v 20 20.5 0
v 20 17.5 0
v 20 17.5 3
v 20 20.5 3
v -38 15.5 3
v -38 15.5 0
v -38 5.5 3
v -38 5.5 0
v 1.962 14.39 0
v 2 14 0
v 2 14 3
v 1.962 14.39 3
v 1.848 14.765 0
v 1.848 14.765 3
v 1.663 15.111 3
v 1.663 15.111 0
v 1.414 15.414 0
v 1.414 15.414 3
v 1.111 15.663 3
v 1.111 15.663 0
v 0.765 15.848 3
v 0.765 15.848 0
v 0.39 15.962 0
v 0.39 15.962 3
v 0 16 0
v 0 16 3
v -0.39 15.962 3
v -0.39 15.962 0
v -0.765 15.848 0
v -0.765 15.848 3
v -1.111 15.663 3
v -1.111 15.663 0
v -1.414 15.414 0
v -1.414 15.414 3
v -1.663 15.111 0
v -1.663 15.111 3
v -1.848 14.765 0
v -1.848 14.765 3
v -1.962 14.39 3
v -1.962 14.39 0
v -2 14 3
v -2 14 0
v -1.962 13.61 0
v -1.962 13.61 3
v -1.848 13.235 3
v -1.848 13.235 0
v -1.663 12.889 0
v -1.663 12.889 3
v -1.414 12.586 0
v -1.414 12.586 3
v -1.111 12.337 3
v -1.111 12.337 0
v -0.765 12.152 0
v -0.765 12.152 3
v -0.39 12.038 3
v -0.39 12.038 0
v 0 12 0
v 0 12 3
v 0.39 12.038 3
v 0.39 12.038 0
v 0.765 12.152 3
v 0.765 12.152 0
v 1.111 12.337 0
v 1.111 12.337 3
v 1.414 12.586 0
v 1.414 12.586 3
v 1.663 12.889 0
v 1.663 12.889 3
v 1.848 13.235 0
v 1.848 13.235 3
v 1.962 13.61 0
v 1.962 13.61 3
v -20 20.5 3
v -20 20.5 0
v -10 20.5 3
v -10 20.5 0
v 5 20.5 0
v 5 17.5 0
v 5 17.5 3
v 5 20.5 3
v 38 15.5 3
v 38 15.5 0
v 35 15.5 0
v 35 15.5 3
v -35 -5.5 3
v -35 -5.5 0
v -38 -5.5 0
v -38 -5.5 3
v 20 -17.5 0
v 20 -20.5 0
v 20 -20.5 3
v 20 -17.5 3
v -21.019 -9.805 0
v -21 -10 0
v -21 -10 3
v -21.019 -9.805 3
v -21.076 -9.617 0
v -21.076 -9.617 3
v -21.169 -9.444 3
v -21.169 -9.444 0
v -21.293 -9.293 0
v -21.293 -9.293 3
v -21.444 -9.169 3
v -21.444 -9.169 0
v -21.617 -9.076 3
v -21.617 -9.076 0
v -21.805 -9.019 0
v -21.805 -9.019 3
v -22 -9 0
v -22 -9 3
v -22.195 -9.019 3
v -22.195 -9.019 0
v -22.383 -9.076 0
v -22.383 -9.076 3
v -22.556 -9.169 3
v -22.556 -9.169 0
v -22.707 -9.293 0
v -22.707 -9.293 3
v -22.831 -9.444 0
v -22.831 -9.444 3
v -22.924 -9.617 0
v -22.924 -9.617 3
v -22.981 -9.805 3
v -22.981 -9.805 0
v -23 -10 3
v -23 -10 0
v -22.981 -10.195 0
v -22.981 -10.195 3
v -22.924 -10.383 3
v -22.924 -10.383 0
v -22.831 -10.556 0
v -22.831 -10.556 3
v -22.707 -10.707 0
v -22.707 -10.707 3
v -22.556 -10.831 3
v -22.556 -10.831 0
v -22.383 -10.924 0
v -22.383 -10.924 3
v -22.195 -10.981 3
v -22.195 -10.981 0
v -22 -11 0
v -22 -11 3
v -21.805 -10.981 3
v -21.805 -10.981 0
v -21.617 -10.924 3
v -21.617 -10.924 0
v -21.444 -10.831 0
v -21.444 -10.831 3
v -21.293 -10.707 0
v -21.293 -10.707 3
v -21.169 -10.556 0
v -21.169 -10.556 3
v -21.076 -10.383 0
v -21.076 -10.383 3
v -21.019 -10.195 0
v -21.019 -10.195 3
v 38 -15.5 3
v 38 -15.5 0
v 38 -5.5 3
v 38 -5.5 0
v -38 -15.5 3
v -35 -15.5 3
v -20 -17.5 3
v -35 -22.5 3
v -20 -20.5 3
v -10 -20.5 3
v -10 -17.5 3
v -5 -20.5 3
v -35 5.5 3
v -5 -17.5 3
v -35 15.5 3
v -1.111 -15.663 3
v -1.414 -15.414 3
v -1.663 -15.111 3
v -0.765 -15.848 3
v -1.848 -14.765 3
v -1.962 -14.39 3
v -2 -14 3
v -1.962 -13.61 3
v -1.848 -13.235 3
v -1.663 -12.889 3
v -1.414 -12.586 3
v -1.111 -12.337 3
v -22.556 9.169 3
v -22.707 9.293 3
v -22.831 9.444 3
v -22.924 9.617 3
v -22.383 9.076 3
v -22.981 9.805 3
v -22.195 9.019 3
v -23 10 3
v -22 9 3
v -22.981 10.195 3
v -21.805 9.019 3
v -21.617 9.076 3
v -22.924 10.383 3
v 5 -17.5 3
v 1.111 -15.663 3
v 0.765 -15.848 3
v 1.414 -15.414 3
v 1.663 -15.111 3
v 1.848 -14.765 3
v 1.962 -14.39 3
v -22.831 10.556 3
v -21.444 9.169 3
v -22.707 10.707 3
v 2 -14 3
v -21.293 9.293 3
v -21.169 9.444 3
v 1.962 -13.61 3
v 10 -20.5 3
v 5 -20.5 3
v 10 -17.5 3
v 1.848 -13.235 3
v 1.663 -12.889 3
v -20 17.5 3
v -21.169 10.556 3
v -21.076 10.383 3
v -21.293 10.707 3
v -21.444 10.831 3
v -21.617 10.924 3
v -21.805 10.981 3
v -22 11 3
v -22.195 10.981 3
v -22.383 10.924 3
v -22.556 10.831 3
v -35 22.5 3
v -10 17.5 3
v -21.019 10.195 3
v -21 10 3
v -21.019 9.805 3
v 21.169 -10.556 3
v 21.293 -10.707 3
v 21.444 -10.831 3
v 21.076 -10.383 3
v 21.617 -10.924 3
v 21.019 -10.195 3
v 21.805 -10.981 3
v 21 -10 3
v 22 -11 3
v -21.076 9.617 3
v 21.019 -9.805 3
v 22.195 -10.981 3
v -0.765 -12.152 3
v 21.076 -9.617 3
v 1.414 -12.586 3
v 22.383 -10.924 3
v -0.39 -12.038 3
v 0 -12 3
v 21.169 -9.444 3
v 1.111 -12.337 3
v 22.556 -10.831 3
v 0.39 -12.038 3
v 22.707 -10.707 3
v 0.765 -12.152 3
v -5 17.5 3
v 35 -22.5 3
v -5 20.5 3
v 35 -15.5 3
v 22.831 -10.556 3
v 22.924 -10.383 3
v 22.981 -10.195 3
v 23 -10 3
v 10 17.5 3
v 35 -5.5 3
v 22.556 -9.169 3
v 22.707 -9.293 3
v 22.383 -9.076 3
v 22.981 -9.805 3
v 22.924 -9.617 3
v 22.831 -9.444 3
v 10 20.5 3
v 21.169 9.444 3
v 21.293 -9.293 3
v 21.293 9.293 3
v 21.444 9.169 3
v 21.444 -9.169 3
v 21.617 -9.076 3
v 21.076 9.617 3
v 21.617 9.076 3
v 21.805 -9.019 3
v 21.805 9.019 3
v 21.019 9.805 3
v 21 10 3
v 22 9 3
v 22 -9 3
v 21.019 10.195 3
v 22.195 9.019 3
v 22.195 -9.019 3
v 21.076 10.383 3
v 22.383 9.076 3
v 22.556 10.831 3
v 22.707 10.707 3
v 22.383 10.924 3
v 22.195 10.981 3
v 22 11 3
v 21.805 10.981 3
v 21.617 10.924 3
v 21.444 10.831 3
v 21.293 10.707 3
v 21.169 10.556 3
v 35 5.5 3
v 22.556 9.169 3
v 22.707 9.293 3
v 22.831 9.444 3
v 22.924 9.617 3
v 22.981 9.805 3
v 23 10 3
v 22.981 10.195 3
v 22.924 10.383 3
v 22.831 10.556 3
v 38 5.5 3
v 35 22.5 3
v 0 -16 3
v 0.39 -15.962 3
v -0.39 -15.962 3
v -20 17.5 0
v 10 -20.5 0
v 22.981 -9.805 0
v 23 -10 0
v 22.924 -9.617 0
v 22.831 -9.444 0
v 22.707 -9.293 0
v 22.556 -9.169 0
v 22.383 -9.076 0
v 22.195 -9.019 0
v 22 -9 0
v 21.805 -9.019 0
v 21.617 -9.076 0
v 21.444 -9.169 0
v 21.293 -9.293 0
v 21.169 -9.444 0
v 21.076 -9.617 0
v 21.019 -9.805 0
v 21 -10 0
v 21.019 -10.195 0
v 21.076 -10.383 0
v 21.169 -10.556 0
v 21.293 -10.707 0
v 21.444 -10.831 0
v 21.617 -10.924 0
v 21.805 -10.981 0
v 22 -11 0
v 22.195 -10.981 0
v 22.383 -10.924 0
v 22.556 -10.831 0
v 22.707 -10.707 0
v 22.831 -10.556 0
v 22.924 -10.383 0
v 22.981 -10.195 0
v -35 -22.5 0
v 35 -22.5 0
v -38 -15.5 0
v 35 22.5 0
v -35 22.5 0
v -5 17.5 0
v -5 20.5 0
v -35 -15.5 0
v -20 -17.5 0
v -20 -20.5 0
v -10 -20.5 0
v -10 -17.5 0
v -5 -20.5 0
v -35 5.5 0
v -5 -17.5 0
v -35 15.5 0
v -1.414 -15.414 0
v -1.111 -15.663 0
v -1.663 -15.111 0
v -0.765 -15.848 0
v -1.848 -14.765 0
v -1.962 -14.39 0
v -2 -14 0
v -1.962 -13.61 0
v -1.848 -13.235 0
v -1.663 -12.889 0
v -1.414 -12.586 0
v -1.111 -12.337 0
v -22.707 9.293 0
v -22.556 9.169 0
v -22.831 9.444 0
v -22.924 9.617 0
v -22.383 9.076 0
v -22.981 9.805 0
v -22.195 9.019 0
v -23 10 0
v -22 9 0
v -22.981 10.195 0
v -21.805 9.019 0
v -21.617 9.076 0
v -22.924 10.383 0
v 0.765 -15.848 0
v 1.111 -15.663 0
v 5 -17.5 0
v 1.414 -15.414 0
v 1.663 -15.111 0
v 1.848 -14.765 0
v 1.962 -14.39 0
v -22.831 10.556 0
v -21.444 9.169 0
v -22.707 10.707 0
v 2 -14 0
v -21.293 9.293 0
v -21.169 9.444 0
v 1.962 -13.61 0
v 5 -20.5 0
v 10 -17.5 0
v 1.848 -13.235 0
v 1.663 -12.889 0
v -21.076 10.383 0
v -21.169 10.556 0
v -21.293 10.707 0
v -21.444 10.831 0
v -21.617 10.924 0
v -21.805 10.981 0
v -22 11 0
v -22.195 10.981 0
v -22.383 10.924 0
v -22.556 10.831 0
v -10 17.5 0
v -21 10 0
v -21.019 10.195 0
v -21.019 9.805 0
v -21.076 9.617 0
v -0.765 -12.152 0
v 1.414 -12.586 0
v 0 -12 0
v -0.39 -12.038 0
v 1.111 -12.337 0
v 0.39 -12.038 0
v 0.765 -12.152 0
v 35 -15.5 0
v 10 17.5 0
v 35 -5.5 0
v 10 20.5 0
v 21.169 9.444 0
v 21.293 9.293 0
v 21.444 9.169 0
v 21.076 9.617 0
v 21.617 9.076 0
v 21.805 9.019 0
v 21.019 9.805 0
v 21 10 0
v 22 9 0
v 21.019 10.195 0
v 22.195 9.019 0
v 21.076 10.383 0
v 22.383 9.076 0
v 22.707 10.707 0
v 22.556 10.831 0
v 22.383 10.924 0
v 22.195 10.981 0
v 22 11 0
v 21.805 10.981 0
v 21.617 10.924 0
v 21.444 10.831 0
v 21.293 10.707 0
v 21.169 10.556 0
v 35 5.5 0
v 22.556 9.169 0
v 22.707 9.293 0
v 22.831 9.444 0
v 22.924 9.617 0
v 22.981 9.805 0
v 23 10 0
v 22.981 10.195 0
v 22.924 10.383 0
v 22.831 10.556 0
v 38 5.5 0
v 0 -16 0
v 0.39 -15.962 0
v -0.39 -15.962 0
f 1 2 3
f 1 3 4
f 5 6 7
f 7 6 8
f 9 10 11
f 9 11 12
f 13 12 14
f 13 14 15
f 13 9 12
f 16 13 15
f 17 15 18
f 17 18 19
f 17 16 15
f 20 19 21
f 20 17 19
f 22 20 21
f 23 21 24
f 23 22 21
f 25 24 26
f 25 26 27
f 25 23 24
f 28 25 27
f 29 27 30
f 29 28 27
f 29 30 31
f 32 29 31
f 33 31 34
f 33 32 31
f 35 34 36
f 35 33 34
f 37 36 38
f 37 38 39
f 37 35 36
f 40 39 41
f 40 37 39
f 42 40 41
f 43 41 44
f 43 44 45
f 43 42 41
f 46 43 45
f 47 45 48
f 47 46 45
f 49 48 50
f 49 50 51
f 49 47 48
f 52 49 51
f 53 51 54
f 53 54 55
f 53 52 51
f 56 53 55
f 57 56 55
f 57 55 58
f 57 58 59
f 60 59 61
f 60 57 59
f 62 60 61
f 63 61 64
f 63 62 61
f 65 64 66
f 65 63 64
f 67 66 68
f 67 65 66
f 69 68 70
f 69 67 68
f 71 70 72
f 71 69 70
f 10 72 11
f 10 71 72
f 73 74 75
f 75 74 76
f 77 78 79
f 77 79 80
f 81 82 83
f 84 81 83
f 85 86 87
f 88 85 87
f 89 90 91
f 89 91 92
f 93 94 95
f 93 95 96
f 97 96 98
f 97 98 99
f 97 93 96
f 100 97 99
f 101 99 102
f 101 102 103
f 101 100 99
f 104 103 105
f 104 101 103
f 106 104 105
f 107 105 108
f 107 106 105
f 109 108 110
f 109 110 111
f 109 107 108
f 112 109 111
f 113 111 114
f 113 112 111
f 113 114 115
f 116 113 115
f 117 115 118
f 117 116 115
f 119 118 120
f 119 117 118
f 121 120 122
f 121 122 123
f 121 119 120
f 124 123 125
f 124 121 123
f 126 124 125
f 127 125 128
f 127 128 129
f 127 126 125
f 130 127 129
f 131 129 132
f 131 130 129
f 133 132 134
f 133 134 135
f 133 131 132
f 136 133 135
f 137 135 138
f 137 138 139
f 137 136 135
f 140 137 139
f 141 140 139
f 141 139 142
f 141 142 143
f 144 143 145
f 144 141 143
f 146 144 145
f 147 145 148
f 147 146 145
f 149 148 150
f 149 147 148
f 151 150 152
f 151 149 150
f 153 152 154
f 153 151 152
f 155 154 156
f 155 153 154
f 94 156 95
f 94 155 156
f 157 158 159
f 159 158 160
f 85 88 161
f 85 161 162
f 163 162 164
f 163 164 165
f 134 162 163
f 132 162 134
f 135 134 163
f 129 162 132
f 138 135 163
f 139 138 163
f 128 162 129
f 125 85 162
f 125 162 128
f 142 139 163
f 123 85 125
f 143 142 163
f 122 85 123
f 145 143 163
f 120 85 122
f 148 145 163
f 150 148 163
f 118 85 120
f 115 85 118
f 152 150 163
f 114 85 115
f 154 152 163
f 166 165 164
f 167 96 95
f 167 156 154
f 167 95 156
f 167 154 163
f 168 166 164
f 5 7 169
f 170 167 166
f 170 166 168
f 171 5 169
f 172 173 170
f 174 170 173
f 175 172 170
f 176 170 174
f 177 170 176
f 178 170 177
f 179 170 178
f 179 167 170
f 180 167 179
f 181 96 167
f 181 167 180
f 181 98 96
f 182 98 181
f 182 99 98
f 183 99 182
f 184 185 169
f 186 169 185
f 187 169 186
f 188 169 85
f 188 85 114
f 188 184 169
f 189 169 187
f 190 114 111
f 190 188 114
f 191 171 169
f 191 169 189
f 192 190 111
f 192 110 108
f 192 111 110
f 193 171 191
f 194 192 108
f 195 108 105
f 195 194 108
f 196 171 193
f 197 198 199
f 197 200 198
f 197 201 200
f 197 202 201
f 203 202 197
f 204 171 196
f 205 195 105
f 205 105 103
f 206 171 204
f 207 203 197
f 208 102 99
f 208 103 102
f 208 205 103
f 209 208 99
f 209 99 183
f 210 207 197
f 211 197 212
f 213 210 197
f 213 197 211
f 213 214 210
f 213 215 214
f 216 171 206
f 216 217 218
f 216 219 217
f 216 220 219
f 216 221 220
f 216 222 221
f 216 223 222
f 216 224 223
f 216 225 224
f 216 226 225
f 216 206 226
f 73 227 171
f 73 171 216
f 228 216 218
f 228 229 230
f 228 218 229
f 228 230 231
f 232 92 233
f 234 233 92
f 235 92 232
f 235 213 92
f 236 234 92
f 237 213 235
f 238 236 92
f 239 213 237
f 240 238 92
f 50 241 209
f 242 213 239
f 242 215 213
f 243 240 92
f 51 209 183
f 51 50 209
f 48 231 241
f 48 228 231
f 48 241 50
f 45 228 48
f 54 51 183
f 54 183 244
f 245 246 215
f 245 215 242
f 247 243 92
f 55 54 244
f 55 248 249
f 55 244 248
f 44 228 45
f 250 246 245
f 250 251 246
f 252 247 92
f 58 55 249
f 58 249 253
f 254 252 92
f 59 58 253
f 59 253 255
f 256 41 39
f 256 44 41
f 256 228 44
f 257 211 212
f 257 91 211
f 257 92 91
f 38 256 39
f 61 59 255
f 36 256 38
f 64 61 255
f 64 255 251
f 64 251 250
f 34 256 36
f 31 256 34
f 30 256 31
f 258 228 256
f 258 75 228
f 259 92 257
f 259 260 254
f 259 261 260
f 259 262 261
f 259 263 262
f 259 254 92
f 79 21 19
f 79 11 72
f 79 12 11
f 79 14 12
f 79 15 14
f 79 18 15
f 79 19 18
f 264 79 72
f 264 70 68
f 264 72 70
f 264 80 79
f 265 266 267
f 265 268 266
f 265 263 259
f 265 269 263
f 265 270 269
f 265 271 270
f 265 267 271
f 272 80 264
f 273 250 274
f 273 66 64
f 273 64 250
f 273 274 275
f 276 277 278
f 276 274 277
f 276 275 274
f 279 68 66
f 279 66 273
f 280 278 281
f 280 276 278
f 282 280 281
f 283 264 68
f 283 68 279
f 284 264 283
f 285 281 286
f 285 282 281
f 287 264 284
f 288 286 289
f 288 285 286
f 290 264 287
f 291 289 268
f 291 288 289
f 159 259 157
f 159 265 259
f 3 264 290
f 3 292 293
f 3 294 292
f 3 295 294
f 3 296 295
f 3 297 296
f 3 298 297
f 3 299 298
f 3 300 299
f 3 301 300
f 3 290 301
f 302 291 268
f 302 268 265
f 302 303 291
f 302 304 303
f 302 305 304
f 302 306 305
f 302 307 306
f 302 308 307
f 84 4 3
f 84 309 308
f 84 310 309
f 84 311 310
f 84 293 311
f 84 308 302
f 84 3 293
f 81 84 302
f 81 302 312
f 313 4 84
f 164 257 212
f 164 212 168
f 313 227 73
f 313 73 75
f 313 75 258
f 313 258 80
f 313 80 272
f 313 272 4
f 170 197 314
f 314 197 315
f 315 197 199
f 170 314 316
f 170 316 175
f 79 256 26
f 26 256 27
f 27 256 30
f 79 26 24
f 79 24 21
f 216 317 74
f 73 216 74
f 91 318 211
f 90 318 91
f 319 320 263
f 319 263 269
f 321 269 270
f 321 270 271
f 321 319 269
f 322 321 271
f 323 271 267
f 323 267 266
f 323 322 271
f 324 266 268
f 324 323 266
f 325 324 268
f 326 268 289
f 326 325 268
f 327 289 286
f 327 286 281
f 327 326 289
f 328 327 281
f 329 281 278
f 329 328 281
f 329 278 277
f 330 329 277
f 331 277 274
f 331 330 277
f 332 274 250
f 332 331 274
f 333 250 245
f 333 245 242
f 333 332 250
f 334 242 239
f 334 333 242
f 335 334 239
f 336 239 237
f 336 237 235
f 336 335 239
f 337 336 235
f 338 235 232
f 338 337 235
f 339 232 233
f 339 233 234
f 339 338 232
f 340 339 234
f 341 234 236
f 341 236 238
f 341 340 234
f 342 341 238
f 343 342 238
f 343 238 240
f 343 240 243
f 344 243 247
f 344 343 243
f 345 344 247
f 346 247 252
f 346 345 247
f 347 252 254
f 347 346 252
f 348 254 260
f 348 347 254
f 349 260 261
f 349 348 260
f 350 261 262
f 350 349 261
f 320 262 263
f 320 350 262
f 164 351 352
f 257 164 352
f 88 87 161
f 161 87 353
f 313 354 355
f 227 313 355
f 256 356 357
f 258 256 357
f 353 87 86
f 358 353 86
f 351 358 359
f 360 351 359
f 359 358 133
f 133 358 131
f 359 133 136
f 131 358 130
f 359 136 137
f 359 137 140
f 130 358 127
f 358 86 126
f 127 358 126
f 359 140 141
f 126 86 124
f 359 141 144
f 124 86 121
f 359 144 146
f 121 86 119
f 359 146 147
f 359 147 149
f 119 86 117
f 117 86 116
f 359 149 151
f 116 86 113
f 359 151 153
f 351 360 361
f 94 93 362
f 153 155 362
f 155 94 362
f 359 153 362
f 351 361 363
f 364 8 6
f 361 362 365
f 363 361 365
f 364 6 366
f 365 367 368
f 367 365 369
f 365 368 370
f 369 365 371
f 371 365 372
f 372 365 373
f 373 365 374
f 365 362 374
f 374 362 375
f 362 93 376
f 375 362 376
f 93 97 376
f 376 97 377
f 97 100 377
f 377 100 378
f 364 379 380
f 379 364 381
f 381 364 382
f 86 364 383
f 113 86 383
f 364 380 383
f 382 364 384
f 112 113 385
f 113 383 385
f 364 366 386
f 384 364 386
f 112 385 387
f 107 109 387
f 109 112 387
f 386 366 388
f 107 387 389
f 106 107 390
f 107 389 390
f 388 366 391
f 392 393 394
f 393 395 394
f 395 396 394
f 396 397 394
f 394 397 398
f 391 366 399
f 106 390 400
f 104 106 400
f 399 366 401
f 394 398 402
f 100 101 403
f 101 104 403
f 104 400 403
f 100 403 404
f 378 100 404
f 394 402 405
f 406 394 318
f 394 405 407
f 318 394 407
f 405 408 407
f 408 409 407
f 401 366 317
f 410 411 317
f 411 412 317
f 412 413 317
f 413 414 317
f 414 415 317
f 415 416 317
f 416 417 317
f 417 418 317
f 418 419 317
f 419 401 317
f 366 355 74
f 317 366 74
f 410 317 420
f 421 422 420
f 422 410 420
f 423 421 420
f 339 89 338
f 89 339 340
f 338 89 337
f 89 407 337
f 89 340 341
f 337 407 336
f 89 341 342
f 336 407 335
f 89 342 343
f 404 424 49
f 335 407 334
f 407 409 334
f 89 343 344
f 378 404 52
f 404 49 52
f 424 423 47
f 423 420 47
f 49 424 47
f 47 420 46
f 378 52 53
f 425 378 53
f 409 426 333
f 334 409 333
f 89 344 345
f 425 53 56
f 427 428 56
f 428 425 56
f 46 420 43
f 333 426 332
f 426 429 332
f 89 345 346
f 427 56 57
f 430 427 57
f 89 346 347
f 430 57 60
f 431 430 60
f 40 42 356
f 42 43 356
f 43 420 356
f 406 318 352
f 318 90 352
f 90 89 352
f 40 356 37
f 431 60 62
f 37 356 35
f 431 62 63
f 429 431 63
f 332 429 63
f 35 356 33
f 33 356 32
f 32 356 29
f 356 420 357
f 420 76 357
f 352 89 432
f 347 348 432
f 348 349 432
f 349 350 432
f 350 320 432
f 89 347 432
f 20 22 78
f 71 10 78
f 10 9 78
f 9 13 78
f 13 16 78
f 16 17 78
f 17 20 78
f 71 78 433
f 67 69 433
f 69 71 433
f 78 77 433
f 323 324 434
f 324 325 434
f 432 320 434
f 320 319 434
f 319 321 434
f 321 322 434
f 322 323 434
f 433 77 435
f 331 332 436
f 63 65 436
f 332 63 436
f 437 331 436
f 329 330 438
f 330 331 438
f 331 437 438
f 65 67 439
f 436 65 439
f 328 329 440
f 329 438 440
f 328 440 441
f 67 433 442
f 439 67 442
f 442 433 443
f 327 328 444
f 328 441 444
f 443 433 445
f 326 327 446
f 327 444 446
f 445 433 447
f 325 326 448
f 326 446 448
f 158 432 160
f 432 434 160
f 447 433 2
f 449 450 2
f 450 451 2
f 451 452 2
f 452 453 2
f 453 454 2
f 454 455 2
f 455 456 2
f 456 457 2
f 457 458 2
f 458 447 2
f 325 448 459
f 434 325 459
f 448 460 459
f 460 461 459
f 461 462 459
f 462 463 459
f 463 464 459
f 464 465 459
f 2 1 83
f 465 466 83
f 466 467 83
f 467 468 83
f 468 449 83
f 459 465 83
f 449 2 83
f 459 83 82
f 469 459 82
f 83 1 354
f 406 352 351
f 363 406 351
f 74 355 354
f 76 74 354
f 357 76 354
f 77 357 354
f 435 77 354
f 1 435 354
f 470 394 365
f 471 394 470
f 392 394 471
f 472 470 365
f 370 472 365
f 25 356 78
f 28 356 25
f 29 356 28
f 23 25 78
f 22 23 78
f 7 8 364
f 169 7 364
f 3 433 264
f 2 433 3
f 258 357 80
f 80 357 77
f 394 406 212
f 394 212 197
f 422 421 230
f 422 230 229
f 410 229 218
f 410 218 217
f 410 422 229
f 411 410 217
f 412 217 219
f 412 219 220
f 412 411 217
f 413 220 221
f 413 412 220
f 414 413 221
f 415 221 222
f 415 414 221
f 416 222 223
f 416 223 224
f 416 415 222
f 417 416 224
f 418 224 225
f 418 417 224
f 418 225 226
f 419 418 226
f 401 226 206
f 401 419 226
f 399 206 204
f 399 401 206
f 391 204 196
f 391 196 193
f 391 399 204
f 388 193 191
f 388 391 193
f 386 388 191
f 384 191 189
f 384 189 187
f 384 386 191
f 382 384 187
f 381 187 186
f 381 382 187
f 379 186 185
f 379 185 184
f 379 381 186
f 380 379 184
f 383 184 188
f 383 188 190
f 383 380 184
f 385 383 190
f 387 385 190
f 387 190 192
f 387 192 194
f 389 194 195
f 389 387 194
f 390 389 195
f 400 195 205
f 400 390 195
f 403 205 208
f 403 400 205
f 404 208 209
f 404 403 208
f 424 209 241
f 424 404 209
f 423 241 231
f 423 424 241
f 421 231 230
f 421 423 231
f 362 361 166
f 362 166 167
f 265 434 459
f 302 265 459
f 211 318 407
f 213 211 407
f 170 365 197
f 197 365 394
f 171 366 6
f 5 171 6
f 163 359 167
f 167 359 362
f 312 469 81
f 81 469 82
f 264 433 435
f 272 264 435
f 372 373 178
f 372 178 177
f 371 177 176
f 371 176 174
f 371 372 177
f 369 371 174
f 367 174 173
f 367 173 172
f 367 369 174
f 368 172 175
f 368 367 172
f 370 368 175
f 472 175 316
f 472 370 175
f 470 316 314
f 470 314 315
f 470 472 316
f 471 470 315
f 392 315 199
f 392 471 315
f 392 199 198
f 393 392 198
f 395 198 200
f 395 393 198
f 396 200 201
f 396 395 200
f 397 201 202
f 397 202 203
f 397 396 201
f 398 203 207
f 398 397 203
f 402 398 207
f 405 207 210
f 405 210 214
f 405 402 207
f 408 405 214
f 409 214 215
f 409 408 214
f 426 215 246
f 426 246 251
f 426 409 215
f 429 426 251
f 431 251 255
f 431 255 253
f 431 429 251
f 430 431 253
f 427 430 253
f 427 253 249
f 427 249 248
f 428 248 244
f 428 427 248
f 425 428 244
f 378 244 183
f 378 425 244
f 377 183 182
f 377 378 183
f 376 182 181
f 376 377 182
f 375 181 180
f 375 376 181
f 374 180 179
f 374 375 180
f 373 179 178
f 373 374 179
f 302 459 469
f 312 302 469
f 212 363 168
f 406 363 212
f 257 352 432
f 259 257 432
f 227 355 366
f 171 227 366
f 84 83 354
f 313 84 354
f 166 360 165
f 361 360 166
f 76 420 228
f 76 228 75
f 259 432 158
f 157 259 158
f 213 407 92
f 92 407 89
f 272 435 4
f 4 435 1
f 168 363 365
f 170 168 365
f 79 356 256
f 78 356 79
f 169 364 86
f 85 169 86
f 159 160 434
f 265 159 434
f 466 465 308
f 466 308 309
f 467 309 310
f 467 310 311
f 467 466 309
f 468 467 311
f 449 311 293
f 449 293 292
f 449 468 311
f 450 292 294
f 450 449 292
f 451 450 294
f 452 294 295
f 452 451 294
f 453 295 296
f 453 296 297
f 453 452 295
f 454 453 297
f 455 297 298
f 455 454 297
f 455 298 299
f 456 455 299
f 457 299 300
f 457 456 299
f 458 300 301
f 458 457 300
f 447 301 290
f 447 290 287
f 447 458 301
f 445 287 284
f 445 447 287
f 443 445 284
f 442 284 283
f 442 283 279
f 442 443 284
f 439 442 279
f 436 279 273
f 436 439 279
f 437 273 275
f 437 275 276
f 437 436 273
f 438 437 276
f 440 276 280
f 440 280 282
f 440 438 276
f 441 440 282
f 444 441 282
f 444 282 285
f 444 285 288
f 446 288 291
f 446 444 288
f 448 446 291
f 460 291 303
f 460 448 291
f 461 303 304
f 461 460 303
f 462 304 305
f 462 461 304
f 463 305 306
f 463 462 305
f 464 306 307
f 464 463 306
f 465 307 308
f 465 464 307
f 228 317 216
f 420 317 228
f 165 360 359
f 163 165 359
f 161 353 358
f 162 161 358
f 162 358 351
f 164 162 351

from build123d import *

# Parameters (mm, degrees)
SKETCH_1_R      = 2
SKETCH_1_R_2    = 1
SKETCH_1_W      = 10
SKETCH_1_H      = 3
EXTRUDE_1_DEPTH = 3


with BuildPart() as part:
    # 草图1 → 凸台-拉伸1 (new body)
    with BuildSketch(Plane.XY):
        Polygon((-35, 17.5), (-35, 15.5), (-38, 15.5), (-38, 5.5), (-35, 5.5), (-35, -5.5), (-38, -5.5), (-38, -15.5), (-35, -15.5), (-35, -17.5), (-35, -22.5), (35, -22.5), (35, -17.5), (35, -15.5), (38, -15.5), (38, -5.5), (35, -5.5), (35, 5.5), (38, 5.5), (38, 15.5), (35, 15.5), (35, 17.5), (35, 22.5), (-35, 22.5), align=None)
        with Locations((0, 14)):
            Circle(SKETCH_1_R, mode=Mode.SUBTRACT)
        with Locations(Location((0, -14, 0), (0, 0, 180))):
            Circle(SKETCH_1_R, mode=Mode.SUBTRACT)
        with Locations((22, 10)):
            Circle(SKETCH_1_R_2, mode=Mode.SUBTRACT)
        with Locations((22, -10)):
            Circle(SKETCH_1_R_2, mode=Mode.SUBTRACT)
        with Locations((-22, -10)):
            Circle(SKETCH_1_R_2, mode=Mode.SUBTRACT)
        with Locations((-22, 10)):
            Circle(SKETCH_1_R_2, mode=Mode.SUBTRACT)
        with Locations((0, 19)):
            Rectangle(SKETCH_1_W, SKETCH_1_H, mode=Mode.SUBTRACT)
        with Locations((-15, 19)):
            Rectangle(SKETCH_1_W, SKETCH_1_H, mode=Mode.SUBTRACT)
        with Locations((15, 19)):
            Rectangle(SKETCH_1_W, SKETCH_1_H, mode=Mode.SUBTRACT)
        with Locations((15, -19)):
            Rectangle(SKETCH_1_W, SKETCH_1_H, mode=Mode.SUBTRACT)
        with Locations((0, -19)):
            Rectangle(SKETCH_1_W, SKETCH_1_H, mode=Mode.SUBTRACT)
        with Locations((-15, -19)):
            Rectangle(SKETCH_1_W, SKETCH_1_H, mode=Mode.SUBTRACT)
    extrude(amount=EXTRUDE_1_DEPTH)


solid = part.part
